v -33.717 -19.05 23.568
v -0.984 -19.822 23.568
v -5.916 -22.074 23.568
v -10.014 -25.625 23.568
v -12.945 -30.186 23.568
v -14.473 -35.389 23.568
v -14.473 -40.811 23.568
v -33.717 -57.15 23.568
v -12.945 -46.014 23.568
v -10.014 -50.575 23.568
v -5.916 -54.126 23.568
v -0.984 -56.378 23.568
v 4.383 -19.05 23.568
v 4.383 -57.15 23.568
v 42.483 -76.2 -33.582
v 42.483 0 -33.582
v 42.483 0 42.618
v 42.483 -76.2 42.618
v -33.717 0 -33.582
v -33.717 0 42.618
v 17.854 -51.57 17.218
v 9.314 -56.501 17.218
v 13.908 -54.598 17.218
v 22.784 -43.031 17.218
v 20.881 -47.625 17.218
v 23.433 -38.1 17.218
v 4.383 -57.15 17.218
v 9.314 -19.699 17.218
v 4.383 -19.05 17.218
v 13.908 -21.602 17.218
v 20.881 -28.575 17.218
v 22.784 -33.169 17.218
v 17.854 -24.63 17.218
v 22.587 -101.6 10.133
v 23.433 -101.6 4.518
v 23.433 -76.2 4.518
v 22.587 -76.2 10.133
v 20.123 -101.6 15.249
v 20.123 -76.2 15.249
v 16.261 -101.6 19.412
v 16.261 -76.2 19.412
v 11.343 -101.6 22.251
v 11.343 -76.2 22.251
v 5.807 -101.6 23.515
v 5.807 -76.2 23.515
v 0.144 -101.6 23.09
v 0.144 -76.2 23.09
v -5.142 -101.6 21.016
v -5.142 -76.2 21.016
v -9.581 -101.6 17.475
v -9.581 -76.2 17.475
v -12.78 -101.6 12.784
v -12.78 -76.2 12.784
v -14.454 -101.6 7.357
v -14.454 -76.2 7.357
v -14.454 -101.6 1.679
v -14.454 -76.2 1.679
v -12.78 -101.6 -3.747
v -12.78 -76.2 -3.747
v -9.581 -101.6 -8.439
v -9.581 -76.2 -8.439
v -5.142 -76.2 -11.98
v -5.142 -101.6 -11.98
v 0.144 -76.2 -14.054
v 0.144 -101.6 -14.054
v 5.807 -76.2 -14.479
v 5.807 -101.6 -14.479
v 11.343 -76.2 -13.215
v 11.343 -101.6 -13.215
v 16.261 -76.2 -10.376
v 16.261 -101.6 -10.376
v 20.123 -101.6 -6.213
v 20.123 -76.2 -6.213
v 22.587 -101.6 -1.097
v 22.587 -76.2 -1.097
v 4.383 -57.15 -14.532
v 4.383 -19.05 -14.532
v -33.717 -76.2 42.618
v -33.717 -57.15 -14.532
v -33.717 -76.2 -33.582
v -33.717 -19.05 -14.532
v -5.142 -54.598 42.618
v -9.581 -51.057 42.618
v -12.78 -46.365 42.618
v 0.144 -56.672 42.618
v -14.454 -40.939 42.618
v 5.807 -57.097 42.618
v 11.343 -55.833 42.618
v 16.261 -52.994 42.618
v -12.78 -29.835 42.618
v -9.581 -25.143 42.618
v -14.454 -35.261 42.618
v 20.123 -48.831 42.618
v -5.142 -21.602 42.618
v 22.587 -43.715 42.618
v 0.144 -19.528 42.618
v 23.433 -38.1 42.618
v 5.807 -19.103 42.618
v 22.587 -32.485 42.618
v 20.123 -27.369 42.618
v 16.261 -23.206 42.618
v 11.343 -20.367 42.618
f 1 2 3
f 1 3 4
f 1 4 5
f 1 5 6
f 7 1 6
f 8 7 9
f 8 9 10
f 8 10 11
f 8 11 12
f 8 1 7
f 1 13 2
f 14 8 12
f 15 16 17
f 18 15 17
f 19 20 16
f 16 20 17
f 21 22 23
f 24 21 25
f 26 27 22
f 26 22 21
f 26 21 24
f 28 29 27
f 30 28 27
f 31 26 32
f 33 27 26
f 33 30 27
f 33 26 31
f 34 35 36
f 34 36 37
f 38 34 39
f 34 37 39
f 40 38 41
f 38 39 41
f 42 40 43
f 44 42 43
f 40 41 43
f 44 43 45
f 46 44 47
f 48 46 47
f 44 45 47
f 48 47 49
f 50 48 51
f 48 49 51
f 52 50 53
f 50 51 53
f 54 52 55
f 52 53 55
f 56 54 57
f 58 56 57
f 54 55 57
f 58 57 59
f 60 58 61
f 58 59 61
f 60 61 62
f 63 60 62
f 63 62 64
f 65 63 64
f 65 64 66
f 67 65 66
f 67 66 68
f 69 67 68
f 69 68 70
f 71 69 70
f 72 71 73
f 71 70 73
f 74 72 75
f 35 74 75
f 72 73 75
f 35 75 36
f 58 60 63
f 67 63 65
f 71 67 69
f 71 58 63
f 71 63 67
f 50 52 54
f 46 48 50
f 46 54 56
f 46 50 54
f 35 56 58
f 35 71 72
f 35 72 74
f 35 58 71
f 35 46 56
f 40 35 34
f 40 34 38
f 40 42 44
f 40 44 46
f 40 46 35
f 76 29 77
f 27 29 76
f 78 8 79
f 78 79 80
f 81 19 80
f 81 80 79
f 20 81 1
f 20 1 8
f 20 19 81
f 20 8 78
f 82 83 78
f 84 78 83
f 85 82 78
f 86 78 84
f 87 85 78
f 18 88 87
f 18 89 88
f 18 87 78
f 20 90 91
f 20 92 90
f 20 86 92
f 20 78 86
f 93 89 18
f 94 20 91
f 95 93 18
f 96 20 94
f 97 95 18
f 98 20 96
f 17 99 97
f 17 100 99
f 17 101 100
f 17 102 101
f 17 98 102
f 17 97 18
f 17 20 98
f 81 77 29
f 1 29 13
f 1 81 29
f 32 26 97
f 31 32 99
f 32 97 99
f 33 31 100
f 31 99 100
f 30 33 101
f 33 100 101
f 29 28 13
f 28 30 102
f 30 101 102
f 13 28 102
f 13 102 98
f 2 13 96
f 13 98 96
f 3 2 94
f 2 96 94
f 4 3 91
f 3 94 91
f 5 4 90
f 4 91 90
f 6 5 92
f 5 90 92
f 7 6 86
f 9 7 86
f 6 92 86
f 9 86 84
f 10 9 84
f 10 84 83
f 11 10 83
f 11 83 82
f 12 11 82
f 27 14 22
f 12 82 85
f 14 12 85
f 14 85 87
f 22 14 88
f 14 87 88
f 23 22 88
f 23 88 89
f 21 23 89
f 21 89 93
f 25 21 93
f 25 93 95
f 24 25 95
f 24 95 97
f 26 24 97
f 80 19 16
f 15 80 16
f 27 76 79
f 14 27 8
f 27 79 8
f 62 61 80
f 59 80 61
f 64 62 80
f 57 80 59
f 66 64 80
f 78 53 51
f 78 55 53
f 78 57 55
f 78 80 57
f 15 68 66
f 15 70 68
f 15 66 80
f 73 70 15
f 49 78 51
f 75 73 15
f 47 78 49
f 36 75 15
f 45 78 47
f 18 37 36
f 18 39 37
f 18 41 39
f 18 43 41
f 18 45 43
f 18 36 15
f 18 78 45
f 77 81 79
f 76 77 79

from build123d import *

# Parameters (mm, degrees)
F0_W     = 76.2
F0_H     = 76.2
F1_DEPTH = 76.2
F2_R     = 19.05
F3_DEPTH = 25.4
F4_R     = 19.05
F5_DEPTH = 25.4
F6_W     = 38.1
F6_H     = 38.1
F7_DEPTH = 38.1


with BuildPart() as f1:
    # F0 (on Front) → F1 (new body)
    with BuildSketch(Plane.XZ):
        with Locations((4.383184, 4.518054)):
            Rectangle(F0_W, F0_H)
    extrude(amount=F1_DEPTH)

    # F2 (on face) → F3 (join)
    with BuildSketch(Plane.XZ.offset(76.2)):
        with Locations((4.383184, 4.518054)):
            Circle(F2_R)
    extrude(amount=F3_DEPTH)

    # F4 (on face) → F5 (cut)
    with BuildSketch(Plane.XY.offset(42.618054)):
        with Locations((4.383184, -38.1)):
            Circle(F4_R)
    extrude(amount=-F5_DEPTH, mode=Mode.SUBTRACT)

    # F6 (on face) → F7 (cut)
    with BuildSketch(Plane(origin=(-33.716816, 0, 0), x_dir=(0, -1, 0), z_dir=(-1, 0, 0))):
        with Locations((38.1, 4.518054)):
            Rectangle(F6_W, F6_H)
    extrude(amount=-F7_DEPTH, mode=Mode.SUBTRACT)


solid = f1.part
